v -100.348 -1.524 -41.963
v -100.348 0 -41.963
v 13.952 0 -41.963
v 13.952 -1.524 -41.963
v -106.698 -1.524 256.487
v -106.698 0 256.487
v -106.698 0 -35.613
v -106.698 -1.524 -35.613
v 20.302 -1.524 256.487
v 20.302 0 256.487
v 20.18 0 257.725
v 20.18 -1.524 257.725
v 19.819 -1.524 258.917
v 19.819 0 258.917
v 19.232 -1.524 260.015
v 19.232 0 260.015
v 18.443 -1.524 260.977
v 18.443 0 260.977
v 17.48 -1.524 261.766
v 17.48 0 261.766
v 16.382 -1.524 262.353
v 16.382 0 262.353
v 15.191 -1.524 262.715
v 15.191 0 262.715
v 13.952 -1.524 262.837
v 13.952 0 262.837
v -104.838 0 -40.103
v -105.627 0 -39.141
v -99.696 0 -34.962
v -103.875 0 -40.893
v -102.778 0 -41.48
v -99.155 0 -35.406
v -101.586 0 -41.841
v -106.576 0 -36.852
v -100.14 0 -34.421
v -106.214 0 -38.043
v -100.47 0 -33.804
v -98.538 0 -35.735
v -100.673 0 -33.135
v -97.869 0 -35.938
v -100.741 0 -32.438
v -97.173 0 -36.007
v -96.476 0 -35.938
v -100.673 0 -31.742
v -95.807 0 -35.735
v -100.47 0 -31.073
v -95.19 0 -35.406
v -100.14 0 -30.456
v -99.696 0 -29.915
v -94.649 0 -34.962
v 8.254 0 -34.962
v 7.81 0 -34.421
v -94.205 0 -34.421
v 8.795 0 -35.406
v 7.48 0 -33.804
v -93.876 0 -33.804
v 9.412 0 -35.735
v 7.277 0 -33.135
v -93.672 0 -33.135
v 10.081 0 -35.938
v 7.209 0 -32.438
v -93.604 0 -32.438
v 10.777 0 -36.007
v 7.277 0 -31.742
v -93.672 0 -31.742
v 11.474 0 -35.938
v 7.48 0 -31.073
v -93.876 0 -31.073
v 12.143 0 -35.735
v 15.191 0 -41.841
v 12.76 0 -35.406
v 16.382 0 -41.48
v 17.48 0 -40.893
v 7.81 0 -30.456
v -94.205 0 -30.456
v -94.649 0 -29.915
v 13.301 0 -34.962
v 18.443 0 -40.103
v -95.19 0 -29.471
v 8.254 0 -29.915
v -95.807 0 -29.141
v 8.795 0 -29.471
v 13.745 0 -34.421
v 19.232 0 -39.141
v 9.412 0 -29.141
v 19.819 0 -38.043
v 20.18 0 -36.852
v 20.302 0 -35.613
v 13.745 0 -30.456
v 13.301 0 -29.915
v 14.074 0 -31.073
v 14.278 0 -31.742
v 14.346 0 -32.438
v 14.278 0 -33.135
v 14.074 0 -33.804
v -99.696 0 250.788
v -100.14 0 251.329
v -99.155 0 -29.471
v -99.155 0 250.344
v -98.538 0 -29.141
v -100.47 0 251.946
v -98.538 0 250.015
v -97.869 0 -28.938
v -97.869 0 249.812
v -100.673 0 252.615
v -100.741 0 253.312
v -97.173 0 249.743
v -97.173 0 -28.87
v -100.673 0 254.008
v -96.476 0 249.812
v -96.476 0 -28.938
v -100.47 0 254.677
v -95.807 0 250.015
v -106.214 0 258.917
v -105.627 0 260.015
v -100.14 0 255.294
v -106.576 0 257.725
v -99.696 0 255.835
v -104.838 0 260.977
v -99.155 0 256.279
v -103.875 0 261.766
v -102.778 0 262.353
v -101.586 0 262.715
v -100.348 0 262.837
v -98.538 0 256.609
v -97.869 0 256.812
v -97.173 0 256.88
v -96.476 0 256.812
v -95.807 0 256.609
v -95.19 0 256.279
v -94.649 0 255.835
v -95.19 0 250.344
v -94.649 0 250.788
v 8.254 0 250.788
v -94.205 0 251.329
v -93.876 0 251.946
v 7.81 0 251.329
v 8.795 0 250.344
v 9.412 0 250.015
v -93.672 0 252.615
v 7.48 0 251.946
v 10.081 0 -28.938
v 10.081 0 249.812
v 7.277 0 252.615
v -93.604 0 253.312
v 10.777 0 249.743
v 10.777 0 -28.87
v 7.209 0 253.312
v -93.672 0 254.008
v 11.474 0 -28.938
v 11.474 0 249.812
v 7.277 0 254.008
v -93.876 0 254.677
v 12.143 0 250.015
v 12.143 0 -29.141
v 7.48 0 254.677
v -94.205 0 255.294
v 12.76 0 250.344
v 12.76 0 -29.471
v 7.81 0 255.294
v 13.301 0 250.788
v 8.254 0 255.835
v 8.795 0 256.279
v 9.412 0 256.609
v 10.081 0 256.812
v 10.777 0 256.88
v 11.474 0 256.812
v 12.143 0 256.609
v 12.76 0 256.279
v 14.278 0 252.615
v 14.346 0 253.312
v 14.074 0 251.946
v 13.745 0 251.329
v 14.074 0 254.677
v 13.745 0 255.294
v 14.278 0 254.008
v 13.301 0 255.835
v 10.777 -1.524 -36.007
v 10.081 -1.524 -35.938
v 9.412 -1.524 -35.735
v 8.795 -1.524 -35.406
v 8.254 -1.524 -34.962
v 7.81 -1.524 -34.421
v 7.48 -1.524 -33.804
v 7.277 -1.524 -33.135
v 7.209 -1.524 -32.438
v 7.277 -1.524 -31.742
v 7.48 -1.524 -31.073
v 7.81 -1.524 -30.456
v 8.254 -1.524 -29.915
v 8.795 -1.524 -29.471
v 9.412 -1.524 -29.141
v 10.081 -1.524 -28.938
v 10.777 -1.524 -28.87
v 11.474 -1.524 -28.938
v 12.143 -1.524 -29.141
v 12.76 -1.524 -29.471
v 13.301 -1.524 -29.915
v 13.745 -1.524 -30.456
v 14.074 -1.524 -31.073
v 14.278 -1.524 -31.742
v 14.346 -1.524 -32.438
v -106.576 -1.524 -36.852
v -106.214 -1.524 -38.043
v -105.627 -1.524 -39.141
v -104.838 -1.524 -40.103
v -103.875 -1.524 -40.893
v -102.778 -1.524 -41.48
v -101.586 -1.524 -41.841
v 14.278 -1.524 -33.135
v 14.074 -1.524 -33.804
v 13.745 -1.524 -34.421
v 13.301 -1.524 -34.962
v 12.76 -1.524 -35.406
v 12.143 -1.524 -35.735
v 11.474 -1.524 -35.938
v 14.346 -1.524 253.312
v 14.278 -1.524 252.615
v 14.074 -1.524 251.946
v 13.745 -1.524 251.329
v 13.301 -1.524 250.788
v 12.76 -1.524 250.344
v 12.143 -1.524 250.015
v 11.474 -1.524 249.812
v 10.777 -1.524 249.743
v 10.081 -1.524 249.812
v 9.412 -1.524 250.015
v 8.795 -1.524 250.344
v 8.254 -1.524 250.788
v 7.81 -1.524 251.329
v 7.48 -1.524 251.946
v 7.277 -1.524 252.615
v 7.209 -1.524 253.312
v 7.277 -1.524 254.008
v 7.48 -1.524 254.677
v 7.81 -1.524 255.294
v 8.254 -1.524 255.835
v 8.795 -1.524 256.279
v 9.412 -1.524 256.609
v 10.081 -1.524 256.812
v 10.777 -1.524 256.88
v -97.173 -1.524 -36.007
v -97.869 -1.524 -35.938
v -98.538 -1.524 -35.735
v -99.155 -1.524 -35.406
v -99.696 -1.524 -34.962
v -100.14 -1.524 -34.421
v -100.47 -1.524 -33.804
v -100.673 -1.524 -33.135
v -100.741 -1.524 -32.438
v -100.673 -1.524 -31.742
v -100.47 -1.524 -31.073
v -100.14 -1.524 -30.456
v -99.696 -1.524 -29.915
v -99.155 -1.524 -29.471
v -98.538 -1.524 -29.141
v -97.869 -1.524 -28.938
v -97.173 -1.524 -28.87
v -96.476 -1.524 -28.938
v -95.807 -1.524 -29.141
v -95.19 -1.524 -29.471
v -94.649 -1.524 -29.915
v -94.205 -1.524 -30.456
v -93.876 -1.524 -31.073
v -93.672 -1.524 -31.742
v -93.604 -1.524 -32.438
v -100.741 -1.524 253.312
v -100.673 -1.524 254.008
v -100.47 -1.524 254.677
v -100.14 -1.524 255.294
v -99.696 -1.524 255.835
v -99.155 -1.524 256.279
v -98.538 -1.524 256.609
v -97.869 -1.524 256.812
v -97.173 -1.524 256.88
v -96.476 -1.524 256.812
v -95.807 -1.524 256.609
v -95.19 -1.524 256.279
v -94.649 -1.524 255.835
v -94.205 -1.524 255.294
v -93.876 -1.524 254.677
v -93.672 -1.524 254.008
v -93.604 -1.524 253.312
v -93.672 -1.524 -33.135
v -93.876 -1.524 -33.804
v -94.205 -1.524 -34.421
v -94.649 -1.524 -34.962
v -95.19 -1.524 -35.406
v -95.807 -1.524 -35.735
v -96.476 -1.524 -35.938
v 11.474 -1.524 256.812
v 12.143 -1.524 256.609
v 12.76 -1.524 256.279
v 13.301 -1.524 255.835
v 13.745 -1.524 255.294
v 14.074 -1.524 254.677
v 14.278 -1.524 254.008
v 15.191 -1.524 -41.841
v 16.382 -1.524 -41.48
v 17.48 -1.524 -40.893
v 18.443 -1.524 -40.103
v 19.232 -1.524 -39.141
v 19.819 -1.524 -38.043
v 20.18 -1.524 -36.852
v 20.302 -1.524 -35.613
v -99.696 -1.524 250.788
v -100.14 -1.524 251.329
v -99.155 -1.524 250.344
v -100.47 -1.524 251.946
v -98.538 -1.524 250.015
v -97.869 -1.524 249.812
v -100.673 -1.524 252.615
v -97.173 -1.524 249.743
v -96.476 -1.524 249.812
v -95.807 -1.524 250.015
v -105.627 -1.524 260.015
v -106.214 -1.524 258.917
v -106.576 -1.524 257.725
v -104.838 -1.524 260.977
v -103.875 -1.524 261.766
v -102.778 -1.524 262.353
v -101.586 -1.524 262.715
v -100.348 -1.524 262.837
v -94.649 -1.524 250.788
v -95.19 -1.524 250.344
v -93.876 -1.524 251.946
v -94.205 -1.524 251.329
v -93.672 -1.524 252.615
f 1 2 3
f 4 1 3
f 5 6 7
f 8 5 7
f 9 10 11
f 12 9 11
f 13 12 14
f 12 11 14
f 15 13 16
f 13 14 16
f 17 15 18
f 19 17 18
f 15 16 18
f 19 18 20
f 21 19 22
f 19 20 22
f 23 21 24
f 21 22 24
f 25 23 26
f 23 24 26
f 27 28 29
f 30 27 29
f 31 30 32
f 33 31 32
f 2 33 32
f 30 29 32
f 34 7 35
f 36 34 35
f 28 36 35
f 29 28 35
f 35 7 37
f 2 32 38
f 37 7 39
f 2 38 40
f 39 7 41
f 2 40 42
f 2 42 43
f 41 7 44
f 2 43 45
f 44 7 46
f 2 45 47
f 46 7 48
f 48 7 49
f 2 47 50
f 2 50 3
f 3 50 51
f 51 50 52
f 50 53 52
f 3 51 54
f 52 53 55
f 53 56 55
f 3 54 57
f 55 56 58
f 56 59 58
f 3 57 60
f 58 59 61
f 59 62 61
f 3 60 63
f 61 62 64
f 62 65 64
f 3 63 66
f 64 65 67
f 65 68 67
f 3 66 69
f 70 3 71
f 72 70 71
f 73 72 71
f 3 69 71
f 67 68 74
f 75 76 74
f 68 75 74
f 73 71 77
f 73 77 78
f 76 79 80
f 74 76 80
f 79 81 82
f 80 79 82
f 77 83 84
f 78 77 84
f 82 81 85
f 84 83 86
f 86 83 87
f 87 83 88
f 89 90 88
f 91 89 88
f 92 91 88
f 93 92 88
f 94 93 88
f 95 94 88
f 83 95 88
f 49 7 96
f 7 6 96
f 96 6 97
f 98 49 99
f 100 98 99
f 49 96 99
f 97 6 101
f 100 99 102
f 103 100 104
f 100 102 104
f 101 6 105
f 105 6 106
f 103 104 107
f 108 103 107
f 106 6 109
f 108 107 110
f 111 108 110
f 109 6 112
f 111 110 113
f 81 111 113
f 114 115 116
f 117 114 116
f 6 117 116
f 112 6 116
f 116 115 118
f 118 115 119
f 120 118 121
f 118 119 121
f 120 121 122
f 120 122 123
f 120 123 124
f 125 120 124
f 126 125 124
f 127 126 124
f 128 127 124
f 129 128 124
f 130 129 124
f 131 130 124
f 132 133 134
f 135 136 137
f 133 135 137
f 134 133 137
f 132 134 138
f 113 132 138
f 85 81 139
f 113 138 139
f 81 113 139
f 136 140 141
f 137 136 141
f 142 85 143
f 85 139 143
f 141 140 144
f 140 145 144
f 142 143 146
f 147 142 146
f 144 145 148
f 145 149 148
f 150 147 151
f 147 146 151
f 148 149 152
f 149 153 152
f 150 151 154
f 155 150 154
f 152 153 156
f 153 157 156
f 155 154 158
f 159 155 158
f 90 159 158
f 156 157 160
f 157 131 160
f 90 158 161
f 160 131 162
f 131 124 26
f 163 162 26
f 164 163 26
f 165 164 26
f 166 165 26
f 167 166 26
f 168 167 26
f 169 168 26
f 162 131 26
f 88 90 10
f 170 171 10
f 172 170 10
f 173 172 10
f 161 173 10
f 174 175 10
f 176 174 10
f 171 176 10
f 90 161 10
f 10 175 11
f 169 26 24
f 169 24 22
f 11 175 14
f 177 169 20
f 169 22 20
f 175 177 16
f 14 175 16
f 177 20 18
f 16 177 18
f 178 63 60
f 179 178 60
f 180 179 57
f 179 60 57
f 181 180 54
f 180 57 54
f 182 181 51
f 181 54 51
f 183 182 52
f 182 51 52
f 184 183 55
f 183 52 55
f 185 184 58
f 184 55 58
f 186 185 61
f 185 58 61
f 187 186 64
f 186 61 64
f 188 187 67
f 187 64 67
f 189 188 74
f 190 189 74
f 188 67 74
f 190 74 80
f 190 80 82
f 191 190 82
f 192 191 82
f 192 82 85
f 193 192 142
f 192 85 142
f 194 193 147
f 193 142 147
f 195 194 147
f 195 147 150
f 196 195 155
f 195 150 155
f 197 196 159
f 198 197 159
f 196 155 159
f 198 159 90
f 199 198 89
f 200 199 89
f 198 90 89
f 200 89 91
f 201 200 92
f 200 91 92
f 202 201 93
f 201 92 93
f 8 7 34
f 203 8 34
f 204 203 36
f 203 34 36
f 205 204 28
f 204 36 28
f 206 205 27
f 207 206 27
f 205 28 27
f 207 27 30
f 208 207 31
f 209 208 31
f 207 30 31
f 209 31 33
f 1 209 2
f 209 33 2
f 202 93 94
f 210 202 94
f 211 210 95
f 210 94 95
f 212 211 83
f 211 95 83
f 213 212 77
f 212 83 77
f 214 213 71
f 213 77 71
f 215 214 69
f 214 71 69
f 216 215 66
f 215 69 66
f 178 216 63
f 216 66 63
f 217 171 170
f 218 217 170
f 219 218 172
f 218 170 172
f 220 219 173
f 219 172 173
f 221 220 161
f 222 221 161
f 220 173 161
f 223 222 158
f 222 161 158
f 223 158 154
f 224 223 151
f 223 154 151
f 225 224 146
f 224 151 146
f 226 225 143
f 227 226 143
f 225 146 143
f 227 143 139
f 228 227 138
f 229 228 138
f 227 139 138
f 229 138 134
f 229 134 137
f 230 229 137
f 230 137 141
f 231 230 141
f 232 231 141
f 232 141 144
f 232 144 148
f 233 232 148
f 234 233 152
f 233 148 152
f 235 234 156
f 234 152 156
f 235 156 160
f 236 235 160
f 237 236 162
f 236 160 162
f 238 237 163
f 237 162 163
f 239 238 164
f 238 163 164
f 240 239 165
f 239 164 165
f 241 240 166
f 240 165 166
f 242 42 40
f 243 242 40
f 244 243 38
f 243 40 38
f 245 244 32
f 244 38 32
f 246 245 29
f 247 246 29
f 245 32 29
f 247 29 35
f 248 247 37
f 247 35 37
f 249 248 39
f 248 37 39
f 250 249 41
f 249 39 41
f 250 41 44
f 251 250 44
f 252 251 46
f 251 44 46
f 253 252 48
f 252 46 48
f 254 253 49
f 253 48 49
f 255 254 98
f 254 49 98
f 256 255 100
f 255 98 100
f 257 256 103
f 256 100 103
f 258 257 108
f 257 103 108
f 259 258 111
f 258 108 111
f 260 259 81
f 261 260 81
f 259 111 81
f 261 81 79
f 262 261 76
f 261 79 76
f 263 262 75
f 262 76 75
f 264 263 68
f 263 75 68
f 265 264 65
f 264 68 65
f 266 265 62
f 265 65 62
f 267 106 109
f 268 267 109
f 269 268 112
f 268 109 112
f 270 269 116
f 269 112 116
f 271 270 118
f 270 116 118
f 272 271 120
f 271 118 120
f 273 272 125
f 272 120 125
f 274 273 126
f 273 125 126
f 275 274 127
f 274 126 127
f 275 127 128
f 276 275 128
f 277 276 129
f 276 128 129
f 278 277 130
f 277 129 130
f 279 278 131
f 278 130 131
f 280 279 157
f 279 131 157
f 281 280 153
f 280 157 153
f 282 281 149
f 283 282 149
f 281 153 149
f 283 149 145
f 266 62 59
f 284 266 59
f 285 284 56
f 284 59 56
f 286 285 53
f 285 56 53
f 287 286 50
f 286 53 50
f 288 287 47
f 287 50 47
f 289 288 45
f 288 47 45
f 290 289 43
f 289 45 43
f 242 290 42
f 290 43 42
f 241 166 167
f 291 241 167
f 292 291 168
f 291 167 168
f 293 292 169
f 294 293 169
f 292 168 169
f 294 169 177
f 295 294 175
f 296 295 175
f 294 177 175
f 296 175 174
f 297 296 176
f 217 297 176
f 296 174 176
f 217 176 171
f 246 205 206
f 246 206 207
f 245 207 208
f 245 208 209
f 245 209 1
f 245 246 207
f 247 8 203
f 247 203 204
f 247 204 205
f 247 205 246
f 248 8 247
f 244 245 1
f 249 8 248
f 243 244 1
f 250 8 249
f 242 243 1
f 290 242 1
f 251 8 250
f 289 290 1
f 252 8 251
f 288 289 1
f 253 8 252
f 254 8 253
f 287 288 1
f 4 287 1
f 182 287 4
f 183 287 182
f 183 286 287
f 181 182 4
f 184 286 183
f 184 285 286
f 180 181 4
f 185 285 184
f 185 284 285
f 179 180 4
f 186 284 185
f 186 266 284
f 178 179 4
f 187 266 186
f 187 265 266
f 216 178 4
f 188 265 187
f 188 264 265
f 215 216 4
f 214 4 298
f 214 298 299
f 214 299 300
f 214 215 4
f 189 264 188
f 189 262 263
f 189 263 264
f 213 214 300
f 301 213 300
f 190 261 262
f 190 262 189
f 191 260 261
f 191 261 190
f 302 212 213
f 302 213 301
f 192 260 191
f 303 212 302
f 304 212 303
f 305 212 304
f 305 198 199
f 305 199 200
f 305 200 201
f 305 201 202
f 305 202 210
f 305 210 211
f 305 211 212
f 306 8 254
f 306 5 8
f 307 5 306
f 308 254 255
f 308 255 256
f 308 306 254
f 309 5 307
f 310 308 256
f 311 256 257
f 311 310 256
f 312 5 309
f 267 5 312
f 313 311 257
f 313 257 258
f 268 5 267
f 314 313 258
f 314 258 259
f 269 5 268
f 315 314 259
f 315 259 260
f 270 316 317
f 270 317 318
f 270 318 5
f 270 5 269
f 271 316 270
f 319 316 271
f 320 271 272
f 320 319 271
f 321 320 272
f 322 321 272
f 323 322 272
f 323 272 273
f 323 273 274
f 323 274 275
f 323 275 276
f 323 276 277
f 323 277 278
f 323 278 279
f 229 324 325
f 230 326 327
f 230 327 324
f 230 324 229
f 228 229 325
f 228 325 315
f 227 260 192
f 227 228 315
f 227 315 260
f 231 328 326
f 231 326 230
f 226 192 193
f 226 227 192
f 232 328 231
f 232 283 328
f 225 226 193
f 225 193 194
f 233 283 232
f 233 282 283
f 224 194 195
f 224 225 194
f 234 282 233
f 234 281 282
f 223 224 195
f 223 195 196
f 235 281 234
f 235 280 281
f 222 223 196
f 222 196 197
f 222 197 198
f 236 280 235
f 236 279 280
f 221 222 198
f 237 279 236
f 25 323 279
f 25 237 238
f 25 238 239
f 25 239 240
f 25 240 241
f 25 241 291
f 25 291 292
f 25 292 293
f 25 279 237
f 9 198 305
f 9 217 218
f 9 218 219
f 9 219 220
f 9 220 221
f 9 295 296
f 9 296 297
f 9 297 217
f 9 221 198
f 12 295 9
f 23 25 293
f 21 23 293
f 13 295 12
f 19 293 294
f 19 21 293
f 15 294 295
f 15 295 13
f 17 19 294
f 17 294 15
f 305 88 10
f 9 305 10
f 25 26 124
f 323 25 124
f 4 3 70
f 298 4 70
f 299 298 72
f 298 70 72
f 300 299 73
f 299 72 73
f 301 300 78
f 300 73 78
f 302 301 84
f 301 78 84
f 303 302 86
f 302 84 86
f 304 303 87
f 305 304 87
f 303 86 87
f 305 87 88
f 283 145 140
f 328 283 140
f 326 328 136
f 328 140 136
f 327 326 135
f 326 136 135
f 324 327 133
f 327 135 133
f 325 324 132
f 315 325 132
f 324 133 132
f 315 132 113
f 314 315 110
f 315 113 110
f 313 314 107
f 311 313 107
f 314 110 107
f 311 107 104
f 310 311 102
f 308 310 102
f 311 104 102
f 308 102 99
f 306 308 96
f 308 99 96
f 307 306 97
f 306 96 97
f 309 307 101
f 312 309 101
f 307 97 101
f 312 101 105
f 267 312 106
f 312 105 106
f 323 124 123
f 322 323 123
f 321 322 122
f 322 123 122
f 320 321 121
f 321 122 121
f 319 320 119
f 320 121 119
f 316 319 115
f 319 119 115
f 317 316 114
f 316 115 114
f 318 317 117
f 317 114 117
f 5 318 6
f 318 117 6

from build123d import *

# Parameters (mm, degrees)
F1_DEPTH = 1.524


with BuildPart() as f1:
    # F0 (on Front) → F1 (new body)
    with BuildSketch(Plane.XZ):
        with BuildLine():
            Line((-97.17259, 262.83665), (-100.34759, 262.83665))
            ThreePointArc((-100.34759, 262.83665), (-104.837718, 260.976778), (-106.69759, 256.48665))
            Line((-106.69759, 256.48665), (-106.69759, 253.31165))
            Line((-106.69759, 253.31165), (-100.74129, 253.31165))
            ThreePointArc((-100.74129, 253.31165), (-99.696042, 255.835102), (-97.17259, 256.88035))
            Line((-97.17259, 256.88035), (-97.17259, 262.83665))
        make_face()
        with BuildLine():
            Line((10.77741, 262.83665), (-97.17259, 262.83665))
            Line((-97.17259, 262.83665), (-97.17259, 256.88035))
            ThreePointArc((-97.17259, 256.88035), (-94.649138, 255.835102), (-93.60389, 253.31165))
            ThreePointArc((-93.60389, 253.31165), (-97.17259, 249.74295), (-100.74129, 253.31165))
            Line((-100.74129, 253.31165), (-106.69759, 253.31165))
            Line((-106.69759, 253.31165), (-106.69759, -32.43835))
            Line((-106.69759, -32.43835), (-100.74129, -32.43835))
            ThreePointArc((-100.74129, -32.43835), (-97.17259, -28.86965), (-93.60389, -32.43835))
            ThreePointArc((-93.60389, -32.43835), (-94.649138, -34.961802), (-97.17259, -36.00705))
            Line((-97.17259, -36.00705), (-97.17259, -41.96335))
            Line((-97.17259, -41.96335), (10.77741, -41.96335))
            Line((10.77741, -41.96335), (10.77741, -36.00705))
            ThreePointArc((10.77741, -36.00705), (8.253958, -29.914898), (14.34611, -32.43835))
            Line((14.34611, -32.43835), (20.30241, -32.43835))
            Line((20.30241, -32.43835), (20.30241, 253.31165))
            Line((20.30241, 253.31165), (14.34611, 253.31165))
            ThreePointArc((14.34611, 253.31165), (8.253958, 250.788198), (10.77741, 256.88035))
            Line((10.77741, 256.88035), (10.77741, 262.83665))
        make_face()
        with BuildLine():
            Line((13.95241, 262.83665), (10.77741, 262.83665))
            Line((10.77741, 262.83665), (10.77741, 256.88035))
            ThreePointArc((10.77741, 256.88035), (13.300862, 255.835102), (14.34611, 253.31165))
            Line((14.34611, 253.31165), (20.30241, 253.31165))
            Line((20.30241, 253.31165), (20.30241, 256.48665))
            ThreePointArc((20.30241, 256.48665), (18.442538, 260.976778), (13.95241, 262.83665))
        make_face()
        with BuildLine():
            Line((-100.74129, -32.43835), (-106.69759, -32.43835))
            Line((-106.69759, -32.43835), (-106.69759, -35.61335))
            ThreePointArc((-106.69759, -35.61335), (-104.837718, -40.103478), (-100.34759, -41.96335))
            Line((-100.34759, -41.96335), (-97.17259, -41.96335))
            Line((-97.17259, -41.96335), (-97.17259, -36.00705))
            ThreePointArc((-97.17259, -36.00705), (-99.696042, -34.961802), (-100.74129, -32.43835))
        make_face()
        with BuildLine():
            Line((20.30241, -35.61335), (20.30241, -32.43835))
            Line((20.30241, -32.43835), (14.34611, -32.43835))
            ThreePointArc((14.34611, -32.43835), (13.300862, -34.961802), (10.77741, -36.00705))
            Line((10.77741, -36.00705), (10.77741, -41.96335))
            Line((10.77741, -41.96335), (13.95241, -41.96335))
            ThreePointArc((13.95241, -41.96335), (18.442538, -40.103478), (20.30241, -35.61335))
        make_face()
    extrude(amount=F1_DEPTH)


solid = f1.part
